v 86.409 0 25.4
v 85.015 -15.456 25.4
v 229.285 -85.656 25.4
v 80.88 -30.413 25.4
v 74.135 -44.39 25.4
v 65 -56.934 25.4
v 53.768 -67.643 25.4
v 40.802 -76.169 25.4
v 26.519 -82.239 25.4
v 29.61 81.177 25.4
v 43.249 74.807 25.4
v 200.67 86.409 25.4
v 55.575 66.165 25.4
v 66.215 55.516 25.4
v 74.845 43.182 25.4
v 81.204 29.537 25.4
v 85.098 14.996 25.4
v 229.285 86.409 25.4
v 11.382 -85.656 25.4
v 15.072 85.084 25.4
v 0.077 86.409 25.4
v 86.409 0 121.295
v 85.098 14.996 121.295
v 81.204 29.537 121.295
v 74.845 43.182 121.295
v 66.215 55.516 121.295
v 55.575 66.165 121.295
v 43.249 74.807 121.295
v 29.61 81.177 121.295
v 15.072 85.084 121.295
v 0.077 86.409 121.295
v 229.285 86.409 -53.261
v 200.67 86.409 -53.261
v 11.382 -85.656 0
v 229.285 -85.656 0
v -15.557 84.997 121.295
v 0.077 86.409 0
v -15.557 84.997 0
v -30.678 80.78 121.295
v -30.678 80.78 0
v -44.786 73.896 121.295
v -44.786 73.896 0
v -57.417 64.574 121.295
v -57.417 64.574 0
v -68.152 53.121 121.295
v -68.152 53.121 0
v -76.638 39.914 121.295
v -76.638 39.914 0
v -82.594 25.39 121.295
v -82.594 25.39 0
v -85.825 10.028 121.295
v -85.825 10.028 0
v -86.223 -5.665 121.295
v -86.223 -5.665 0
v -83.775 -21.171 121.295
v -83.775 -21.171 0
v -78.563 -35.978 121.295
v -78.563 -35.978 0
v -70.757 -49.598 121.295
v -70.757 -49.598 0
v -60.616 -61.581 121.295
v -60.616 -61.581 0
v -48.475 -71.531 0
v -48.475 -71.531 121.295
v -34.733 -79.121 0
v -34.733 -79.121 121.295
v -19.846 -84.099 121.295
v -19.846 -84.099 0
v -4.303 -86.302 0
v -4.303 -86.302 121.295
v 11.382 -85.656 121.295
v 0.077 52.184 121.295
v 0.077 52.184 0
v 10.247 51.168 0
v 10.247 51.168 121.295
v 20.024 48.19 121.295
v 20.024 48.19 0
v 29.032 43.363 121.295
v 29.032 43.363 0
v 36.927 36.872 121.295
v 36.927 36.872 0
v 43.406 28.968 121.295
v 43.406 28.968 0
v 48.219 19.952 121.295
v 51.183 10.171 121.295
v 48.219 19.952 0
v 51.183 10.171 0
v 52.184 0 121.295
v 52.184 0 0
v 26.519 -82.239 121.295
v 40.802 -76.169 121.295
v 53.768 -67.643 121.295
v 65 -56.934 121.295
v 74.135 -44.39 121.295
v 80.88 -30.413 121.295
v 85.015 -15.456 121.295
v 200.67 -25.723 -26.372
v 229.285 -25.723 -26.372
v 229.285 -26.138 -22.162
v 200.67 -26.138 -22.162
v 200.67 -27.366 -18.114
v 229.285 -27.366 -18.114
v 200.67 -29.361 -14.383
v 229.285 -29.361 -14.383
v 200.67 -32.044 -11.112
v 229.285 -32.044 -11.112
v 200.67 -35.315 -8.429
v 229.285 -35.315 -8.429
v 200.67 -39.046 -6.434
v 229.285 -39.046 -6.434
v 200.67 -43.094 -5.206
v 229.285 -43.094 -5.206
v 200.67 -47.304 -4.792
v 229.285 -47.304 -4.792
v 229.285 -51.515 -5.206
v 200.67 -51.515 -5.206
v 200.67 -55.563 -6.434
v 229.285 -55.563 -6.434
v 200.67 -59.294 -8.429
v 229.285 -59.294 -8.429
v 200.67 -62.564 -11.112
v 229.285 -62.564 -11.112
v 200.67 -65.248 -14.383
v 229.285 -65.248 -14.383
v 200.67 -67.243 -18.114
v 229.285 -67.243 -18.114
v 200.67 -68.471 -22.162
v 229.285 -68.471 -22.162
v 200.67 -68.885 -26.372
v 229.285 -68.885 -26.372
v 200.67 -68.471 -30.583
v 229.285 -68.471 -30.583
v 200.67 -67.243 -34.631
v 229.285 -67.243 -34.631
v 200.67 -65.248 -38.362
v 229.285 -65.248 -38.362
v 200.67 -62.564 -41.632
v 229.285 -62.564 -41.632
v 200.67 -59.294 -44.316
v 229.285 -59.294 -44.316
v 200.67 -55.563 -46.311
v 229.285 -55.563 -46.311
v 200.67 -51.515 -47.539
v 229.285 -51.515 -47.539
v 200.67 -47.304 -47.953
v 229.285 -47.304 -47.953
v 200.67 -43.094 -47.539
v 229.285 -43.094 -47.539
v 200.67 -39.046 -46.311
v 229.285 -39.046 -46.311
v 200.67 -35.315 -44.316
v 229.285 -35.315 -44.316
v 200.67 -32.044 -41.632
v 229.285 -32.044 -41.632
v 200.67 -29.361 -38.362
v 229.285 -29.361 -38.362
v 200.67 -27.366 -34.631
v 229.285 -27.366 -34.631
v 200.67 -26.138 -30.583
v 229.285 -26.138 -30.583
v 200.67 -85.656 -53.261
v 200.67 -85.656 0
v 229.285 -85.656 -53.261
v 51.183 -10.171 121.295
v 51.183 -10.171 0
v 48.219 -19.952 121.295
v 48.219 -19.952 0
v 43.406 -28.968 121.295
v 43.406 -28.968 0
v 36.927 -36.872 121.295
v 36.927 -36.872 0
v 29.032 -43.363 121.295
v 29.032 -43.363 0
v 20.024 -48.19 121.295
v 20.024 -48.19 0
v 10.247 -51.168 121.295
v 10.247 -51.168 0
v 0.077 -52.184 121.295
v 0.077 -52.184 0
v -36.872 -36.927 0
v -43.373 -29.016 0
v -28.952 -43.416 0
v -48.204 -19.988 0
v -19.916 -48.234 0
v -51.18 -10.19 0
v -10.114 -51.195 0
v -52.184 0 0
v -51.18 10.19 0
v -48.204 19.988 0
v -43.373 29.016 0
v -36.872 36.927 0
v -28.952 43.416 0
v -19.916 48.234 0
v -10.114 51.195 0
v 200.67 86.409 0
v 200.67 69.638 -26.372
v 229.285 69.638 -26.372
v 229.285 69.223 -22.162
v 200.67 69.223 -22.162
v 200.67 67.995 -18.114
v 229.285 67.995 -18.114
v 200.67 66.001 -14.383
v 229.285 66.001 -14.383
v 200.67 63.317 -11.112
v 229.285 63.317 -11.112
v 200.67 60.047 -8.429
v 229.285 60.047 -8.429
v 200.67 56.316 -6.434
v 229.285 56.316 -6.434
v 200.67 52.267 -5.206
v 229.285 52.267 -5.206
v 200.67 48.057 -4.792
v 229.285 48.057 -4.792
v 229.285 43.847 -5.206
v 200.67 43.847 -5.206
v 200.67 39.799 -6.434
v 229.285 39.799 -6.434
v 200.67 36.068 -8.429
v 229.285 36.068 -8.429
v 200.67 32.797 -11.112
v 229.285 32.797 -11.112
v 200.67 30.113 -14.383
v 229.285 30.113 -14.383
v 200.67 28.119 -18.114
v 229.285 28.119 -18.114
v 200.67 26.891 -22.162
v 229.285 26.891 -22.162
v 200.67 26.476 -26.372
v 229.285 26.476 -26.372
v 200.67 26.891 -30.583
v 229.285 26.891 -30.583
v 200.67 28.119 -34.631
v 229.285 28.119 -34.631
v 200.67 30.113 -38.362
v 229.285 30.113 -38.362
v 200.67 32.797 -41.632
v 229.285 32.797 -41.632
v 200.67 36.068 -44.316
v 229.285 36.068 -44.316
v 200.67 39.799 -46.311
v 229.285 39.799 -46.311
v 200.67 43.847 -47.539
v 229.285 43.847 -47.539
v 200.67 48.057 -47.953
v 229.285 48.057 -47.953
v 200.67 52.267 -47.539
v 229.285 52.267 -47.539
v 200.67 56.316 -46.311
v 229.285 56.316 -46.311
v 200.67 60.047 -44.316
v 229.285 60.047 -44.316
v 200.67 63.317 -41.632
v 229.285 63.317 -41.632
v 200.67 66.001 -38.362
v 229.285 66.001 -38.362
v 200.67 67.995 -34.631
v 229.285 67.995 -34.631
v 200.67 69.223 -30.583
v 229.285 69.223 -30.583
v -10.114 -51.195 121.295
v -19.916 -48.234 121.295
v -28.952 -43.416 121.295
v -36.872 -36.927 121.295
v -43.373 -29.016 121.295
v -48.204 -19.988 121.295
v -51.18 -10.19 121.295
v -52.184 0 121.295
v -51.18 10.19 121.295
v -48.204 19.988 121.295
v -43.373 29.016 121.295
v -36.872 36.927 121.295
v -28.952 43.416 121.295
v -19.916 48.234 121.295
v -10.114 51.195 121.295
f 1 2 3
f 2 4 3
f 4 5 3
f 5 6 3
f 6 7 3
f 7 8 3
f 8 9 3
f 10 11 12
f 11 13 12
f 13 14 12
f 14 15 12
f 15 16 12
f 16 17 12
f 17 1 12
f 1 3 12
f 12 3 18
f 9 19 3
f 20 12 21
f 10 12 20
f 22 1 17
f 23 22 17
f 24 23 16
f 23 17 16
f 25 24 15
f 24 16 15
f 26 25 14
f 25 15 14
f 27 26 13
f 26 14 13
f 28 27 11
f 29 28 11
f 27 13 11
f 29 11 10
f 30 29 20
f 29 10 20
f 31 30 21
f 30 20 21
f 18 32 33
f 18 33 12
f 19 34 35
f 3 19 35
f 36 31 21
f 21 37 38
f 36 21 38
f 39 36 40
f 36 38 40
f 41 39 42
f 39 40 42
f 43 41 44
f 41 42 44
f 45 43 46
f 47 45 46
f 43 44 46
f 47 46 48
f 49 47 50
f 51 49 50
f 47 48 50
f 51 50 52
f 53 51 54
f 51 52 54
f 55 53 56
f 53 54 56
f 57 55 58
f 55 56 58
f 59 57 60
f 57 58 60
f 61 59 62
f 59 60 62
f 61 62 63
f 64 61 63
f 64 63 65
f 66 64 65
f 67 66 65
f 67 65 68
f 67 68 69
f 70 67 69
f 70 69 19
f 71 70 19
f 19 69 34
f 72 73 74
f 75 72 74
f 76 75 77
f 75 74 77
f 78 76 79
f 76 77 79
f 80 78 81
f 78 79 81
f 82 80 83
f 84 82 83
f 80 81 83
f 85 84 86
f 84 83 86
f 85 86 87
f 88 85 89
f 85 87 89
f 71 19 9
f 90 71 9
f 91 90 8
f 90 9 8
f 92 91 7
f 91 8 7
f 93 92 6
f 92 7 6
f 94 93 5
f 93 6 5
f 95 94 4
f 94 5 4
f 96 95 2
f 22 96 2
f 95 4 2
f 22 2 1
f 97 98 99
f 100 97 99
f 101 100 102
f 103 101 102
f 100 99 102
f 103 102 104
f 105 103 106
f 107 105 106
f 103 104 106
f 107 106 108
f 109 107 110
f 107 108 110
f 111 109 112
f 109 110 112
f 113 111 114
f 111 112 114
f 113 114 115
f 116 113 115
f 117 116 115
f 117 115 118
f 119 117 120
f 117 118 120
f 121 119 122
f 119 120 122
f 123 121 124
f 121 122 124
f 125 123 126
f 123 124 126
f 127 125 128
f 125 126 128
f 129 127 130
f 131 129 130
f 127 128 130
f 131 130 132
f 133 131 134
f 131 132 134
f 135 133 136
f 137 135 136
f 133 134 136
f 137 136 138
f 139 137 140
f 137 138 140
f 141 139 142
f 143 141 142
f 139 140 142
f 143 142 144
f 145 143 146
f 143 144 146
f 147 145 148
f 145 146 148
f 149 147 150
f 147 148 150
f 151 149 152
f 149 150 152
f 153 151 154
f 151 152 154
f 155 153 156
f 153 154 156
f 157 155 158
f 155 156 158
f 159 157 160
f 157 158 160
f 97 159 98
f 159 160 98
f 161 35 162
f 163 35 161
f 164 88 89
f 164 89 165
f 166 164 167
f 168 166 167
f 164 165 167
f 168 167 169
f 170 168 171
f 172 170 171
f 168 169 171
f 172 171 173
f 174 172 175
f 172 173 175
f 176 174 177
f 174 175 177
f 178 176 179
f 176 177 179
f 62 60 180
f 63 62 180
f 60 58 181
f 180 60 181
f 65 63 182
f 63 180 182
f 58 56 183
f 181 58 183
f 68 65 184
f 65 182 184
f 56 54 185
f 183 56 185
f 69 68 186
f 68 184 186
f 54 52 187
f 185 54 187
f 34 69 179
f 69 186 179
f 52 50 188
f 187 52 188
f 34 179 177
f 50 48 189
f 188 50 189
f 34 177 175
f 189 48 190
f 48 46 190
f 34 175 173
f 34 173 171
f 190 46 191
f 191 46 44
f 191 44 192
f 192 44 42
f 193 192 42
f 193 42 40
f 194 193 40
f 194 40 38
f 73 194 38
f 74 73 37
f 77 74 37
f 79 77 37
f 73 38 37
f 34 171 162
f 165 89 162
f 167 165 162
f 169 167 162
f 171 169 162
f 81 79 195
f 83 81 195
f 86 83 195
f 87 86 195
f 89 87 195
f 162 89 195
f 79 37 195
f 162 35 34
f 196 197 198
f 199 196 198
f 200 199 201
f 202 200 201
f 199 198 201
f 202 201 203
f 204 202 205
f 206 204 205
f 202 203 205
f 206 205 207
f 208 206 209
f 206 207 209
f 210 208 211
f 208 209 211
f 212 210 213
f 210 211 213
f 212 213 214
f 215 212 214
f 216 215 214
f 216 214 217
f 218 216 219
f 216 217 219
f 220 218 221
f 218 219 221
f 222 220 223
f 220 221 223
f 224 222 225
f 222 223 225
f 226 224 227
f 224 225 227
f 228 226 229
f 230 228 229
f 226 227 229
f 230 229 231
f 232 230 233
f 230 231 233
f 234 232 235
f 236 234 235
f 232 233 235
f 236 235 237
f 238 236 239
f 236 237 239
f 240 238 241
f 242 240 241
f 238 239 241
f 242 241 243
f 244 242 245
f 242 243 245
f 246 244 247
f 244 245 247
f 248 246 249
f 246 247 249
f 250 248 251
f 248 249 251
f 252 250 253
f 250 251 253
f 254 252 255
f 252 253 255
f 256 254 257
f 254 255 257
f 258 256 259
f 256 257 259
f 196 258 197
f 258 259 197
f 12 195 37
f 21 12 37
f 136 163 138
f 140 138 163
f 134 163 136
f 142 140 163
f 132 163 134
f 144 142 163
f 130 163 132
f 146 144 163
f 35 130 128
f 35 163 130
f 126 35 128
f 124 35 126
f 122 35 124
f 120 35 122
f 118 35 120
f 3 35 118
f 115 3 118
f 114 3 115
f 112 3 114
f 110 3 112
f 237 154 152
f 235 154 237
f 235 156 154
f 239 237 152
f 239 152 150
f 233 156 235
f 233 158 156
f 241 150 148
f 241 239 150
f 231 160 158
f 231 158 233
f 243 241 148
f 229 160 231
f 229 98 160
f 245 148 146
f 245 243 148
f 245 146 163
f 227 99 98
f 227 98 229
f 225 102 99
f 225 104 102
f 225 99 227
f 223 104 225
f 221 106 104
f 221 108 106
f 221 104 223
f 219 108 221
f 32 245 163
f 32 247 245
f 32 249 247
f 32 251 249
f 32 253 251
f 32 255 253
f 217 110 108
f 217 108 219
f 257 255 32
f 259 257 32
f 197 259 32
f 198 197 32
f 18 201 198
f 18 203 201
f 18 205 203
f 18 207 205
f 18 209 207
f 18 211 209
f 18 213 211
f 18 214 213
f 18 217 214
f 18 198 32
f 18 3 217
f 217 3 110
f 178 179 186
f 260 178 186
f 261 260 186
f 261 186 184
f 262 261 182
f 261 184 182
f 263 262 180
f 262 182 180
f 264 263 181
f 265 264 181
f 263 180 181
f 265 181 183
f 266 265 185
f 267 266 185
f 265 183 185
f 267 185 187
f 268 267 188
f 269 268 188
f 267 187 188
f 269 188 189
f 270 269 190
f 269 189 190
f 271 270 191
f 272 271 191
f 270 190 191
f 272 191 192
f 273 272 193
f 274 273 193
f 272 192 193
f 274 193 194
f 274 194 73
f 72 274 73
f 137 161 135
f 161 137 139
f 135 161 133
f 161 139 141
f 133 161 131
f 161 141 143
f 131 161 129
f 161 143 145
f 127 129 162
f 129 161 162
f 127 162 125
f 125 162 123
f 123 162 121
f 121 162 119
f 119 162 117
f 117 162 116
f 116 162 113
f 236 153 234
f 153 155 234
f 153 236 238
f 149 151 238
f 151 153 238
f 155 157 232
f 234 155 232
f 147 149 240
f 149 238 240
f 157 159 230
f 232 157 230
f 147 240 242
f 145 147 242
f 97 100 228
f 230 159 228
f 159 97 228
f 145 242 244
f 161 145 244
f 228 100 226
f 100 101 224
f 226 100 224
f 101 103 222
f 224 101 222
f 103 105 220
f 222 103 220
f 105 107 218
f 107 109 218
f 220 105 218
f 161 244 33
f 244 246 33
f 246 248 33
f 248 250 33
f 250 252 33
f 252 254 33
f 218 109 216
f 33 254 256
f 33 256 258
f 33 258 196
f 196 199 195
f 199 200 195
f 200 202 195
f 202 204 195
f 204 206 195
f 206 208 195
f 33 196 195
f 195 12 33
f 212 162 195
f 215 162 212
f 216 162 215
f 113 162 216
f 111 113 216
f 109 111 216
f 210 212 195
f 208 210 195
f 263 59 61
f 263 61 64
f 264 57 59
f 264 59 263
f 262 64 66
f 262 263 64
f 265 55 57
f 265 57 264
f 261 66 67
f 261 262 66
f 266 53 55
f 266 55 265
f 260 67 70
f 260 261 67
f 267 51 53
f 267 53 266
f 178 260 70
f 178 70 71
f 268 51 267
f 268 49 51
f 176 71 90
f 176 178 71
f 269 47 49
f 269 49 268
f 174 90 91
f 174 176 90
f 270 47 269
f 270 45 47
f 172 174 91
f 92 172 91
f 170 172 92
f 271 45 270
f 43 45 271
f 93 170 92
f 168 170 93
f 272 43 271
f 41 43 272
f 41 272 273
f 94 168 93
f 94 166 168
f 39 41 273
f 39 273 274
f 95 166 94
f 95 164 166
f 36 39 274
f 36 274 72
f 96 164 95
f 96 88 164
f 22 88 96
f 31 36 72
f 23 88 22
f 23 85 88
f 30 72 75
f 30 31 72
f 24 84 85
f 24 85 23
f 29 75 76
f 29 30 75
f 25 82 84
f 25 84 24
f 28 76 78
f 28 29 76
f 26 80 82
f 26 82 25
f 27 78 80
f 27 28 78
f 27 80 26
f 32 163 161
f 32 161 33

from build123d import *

# Parameters (mm, degrees)
F1_DEPTH = 25.4
F4_DEPTH = 121.295029
F5_W     = 172.064931
F5_H     = 53.261429
F5_H_2   = 25.4
F2_DEPTH = 28.615158
F6_R     = 21.58089
F3_DEPTH = 28.615158


with BuildPart() as f1:
    # F0 (on Top) → F1 (new body)
    with BuildSketch(Plane.XY):
        with BuildLine():
            ThreePointArc((0.07735, 86.408892), (61.127679, 61.072985), (86.408927, 0))
            ThreePointArc((86.408927, 0), (64.999971, -56.934229), (11.381807, -85.656039))
            Line((11.381807, -85.656039), (229.284793, -85.656039))
            Line((229.284793, -85.656039), (229.284793, 86.408892))
            Line((229.284793, 86.408892), (0.07735, 86.408892))
        make_face()
        with BuildLine():
            Line((0.07735, 52.184075), (0.07735, 86.408892))
            ThreePointArc((0.07735, 86.408892), (-86.223044, -5.66475), (11.381807, -85.656039))
            Line((11.381807, -85.656039), (0.07735, -85.656039))
            Line((0.07735, -85.656039), (0.07735, -52.184075))
            ThreePointArc((0.07735, -52.184075), (-52.184132, 0), (0.07735, 52.184075))
        make_face()
        with BuildLine():
            ThreePointArc((11.381807, -85.656039), (64.999971, -56.934229), (86.408927, 0))
            ThreePointArc((86.408927, 0), (61.127679, 61.072985), (0.07735, 86.408892))
            Line((0.07735, 86.408892), (0.07735, 52.184075))
            ThreePointArc((0.07735, 52.184075), (36.927091, 36.872397), (52.184132, 0))
            ThreePointArc((52.184132, 0), (36.927091, -36.872397), (0.07735, -52.184075))
            Line((0.07735, -52.184075), (0.07735, -85.656039))
            Line((0.07735, -85.656039), (11.381807, -85.656039))
        make_face()
    extrude(amount=F1_DEPTH)

    # F0 (on Top) → F4 (join)
    with BuildSketch(Plane.XY):
        with BuildLine():
            ThreePointArc((11.381807, -85.656039), (64.999971, -56.934229), (86.408927, 0))
            ThreePointArc((86.408927, 0), (61.127679, 61.072985), (0.07735, 86.408892))
            Line((0.07735, 86.408892), (0.07735, 52.184075))
            ThreePointArc((0.07735, 52.184075), (36.927091, 36.872397), (52.184132, 0))
            ThreePointArc((52.184132, 0), (36.927091, -36.872397), (0.07735, -52.184075))
            Line((0.07735, -52.184075), (0.07735, -85.656039))
            Line((0.07735, -85.656039), (11.381807, -85.656039))
        make_face()
        with BuildLine():
            Line((0.07735, 52.184075), (0.07735, 86.408892))
            ThreePointArc((0.07735, 86.408892), (-86.223044, -5.66475), (11.381807, -85.656039))
            Line((11.381807, -85.656039), (0.07735, -85.656039))
            Line((0.07735, -85.656039), (0.07735, -52.184075))
            ThreePointArc((0.07735, -52.184075), (-52.184132, 0), (0.07735, 52.184075))
        make_face()
    extrude(amount=F4_DEPTH)

    # F5 (on face) → F2 (join)
    with BuildSketch(Plane.YZ.offset(229.284793)):
        with Locations((0.376427, -26.630714)):
            Rectangle(F5_W, F5_H)
        with Locations((0.376427, 12.7)):
            Rectangle(F5_W, F5_H_2)
    extrude(amount=-F2_DEPTH)

    # F6 (on face) → F3 (cut, through all)
    with BuildSketch(Plane.YZ.offset(229.284793)):
        with Locations((-47.304388, -26.372436)):
            Circle(F6_R)
        with Locations((48.057241, -26.372436)):
            Circle(F6_R)
    extrude(amount=-F3_DEPTH, mode=Mode.SUBTRACT)


solid = f1.part
